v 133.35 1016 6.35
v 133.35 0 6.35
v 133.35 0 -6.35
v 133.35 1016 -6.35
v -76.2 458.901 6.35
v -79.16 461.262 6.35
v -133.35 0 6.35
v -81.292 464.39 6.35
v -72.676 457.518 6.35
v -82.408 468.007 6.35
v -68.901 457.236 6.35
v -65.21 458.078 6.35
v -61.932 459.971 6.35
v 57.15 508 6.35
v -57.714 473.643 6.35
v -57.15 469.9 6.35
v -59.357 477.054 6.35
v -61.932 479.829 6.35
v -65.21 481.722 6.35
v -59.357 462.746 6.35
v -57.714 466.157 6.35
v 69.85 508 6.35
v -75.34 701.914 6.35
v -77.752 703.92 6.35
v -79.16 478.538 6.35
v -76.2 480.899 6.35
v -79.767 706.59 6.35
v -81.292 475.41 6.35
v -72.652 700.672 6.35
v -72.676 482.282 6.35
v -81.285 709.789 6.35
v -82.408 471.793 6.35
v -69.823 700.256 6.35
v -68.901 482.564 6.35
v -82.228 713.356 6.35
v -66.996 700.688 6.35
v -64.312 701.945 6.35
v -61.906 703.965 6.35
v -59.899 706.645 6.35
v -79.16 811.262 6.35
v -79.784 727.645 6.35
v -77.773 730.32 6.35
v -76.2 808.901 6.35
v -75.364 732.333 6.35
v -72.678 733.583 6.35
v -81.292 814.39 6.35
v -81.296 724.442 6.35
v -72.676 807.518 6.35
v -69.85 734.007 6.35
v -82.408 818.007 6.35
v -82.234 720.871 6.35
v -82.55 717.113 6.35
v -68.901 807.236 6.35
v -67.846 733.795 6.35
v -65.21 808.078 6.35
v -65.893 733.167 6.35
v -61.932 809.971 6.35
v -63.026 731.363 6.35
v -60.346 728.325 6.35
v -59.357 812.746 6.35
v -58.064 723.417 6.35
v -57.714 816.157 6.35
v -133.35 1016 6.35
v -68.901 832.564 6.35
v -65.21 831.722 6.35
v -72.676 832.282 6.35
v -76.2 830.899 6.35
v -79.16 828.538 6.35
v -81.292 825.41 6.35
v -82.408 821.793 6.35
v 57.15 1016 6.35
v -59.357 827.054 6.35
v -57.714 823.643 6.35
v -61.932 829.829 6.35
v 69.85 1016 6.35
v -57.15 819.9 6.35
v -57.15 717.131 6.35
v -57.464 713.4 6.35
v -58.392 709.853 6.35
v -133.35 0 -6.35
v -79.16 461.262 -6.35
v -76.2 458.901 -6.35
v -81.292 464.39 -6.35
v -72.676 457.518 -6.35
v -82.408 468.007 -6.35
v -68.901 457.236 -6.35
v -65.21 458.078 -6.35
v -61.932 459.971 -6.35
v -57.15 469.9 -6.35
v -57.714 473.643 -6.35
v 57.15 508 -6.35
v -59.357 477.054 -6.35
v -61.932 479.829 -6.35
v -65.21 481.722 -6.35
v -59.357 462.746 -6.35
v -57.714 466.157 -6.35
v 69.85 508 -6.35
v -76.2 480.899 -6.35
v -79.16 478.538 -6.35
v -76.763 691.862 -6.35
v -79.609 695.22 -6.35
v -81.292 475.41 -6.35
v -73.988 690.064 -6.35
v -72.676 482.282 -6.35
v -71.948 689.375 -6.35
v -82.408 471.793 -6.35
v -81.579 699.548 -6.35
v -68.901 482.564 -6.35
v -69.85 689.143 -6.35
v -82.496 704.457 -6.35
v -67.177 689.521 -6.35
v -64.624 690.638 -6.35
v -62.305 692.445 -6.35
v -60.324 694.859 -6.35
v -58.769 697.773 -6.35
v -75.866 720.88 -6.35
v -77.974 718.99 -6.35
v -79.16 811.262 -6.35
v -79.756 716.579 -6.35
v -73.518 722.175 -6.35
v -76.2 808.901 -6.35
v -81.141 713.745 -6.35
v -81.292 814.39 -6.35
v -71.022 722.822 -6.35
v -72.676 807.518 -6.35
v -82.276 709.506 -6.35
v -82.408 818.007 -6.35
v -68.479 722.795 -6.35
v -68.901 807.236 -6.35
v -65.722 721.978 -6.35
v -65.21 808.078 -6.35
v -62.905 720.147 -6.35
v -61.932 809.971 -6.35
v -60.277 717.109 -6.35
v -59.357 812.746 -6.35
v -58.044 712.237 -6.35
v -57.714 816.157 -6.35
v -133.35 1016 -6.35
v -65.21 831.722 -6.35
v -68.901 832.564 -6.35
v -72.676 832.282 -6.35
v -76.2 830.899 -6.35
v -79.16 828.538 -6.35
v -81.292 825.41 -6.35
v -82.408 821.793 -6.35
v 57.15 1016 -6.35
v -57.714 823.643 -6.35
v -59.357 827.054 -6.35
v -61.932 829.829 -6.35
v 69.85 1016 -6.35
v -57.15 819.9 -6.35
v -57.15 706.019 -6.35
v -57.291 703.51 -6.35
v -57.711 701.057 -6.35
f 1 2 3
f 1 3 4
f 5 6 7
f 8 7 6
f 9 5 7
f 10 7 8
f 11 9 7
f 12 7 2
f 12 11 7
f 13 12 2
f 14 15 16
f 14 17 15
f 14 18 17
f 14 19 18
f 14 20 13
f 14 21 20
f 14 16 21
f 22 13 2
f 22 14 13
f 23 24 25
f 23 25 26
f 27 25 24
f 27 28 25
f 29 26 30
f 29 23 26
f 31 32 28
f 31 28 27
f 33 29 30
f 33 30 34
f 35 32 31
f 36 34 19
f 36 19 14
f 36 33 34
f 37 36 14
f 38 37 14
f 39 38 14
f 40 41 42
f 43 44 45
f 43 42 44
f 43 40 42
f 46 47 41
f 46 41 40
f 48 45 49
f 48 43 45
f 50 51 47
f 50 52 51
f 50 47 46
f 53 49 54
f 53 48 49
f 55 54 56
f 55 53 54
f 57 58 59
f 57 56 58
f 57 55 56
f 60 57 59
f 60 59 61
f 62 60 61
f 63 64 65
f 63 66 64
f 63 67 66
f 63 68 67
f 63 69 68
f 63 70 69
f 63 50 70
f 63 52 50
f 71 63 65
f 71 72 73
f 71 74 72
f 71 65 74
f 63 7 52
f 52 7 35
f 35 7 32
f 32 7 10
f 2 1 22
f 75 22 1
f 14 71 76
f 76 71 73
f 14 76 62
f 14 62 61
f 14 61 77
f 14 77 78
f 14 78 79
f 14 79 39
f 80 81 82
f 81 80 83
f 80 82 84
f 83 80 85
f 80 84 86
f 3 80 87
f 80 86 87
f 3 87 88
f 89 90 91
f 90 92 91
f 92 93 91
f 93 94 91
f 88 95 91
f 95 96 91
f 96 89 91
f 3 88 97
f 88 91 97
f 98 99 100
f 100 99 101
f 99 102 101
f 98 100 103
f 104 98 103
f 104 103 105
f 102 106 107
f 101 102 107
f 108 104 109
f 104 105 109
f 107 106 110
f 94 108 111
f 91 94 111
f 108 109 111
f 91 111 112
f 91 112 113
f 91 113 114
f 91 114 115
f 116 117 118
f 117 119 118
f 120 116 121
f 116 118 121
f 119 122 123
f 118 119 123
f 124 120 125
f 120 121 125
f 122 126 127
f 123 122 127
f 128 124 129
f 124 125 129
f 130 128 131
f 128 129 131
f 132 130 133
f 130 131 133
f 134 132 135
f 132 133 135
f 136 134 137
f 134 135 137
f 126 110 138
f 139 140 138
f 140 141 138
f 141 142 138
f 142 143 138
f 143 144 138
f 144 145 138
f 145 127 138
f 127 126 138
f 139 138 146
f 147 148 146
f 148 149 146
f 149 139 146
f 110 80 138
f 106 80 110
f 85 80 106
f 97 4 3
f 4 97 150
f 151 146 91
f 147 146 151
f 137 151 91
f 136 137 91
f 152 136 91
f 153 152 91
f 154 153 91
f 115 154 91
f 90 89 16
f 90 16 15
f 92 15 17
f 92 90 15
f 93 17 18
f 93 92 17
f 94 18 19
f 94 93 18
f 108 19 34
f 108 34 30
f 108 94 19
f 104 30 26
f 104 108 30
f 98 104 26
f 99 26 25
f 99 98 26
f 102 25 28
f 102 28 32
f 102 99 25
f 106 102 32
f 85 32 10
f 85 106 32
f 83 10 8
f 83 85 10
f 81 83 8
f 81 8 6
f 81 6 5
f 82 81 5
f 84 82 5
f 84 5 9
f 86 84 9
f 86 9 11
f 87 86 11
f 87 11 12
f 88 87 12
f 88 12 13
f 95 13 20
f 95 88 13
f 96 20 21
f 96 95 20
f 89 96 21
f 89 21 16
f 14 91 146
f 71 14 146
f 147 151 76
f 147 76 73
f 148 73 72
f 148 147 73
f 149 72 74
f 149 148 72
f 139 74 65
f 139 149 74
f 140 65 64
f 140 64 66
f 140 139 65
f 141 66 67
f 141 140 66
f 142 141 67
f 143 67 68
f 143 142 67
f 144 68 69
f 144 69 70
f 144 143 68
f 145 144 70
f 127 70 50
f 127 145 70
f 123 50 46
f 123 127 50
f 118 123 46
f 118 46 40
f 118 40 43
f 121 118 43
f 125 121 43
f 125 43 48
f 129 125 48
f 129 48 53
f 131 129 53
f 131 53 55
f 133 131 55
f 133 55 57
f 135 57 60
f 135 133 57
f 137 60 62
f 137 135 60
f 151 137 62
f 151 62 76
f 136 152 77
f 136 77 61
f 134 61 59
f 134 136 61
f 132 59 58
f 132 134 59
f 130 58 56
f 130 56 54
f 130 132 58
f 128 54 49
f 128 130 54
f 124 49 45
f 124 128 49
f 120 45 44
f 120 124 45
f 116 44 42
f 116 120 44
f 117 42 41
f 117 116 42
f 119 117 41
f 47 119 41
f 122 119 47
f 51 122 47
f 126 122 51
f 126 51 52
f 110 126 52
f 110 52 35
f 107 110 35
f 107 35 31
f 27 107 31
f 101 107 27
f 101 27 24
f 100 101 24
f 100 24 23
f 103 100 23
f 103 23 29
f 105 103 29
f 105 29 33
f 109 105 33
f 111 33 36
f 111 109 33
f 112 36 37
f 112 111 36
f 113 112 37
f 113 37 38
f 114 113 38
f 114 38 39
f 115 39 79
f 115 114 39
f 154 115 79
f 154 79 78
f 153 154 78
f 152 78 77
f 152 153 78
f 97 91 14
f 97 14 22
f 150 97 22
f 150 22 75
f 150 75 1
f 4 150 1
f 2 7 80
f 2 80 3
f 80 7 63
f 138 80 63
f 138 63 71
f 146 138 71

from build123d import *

# Parameters (mm, degrees)
SKETCH2_W               = 266.7
SKETCH2_H               = 1016
BOSS_EXTRUDE1_DEPTH     = 6.35
CAVITY1_START           = -6.35
CAVITY1_OUTLINE_R       = 12.7
CAVITY1_DEPTH           = 12.7
CAVITY1_START_2         = 449.025238005
CAVITY1_2_OUTLINE_R     = 12.7
CAVITY1_2_DEPTH         = 39.100356678
CUT_EXTRUDE3_DEPTH      = 1025.733401915
CUT_EXTRUDE3_DEPTH_BACK = 1025.733401915
SKETCH5_W               = 12.7
SKETCH5_H               = 508


# Read off the part's stored shape, not the designer's step: Cavity1
with BuildPart() as part:
    # Sketch2 → Boss-Extrude1 (new, symmetric)
    with BuildSketch(Plane.XY):
        with Locations((0, 508)):
            Rectangle(SKETCH2_W, SKETCH2_H)
    extrude(amount=BOSS_EXTRUDE1_DEPTH, both=True)

    # Cavity1 outline → Cavity1 (cut)
    with BuildSketch(Plane.XY.offset(CAVITY1_START)):
        with Locations((-69.85, 819.9)):
            Circle(CAVITY1_OUTLINE_R)
        with Locations((-69.85, 469.9)):
            Circle(CAVITY1_OUTLINE_R)
    extrude(amount=CAVITY1_DEPTH, mode=Mode.SUBTRACT)

    # Cavity1 2 outline → Cavity1 2 (cut)
    with BuildSketch(Plane(origin=(0, 0, 0), x_dir=(1, 0, 0), z_dir=(0, 0.658504607868519, 0.752576694706877)).offset(CAVITY1_START_2)):
        with Locations((-69.85, 535.514761536)):
            Circle(CAVITY1_2_OUTLINE_R)
    extrude(amount=CAVITY1_2_DEPTH, mode=Mode.SUBTRACT)

    # Sketch5 → Cut-Extrude3 (cut, two sides: drawn at the far end of the back side and taken through both)
    with BuildSketch(Plane.XY.offset(-CUT_EXTRUDE3_DEPTH_BACK)):
        with Locations((63.5, 762)):
            Rectangle(SKETCH5_W, SKETCH5_H)
    extrude(amount=CUT_EXTRUDE3_DEPTH + CUT_EXTRUDE3_DEPTH_BACK, mode=Mode.SUBTRACT)


solid = part.part
